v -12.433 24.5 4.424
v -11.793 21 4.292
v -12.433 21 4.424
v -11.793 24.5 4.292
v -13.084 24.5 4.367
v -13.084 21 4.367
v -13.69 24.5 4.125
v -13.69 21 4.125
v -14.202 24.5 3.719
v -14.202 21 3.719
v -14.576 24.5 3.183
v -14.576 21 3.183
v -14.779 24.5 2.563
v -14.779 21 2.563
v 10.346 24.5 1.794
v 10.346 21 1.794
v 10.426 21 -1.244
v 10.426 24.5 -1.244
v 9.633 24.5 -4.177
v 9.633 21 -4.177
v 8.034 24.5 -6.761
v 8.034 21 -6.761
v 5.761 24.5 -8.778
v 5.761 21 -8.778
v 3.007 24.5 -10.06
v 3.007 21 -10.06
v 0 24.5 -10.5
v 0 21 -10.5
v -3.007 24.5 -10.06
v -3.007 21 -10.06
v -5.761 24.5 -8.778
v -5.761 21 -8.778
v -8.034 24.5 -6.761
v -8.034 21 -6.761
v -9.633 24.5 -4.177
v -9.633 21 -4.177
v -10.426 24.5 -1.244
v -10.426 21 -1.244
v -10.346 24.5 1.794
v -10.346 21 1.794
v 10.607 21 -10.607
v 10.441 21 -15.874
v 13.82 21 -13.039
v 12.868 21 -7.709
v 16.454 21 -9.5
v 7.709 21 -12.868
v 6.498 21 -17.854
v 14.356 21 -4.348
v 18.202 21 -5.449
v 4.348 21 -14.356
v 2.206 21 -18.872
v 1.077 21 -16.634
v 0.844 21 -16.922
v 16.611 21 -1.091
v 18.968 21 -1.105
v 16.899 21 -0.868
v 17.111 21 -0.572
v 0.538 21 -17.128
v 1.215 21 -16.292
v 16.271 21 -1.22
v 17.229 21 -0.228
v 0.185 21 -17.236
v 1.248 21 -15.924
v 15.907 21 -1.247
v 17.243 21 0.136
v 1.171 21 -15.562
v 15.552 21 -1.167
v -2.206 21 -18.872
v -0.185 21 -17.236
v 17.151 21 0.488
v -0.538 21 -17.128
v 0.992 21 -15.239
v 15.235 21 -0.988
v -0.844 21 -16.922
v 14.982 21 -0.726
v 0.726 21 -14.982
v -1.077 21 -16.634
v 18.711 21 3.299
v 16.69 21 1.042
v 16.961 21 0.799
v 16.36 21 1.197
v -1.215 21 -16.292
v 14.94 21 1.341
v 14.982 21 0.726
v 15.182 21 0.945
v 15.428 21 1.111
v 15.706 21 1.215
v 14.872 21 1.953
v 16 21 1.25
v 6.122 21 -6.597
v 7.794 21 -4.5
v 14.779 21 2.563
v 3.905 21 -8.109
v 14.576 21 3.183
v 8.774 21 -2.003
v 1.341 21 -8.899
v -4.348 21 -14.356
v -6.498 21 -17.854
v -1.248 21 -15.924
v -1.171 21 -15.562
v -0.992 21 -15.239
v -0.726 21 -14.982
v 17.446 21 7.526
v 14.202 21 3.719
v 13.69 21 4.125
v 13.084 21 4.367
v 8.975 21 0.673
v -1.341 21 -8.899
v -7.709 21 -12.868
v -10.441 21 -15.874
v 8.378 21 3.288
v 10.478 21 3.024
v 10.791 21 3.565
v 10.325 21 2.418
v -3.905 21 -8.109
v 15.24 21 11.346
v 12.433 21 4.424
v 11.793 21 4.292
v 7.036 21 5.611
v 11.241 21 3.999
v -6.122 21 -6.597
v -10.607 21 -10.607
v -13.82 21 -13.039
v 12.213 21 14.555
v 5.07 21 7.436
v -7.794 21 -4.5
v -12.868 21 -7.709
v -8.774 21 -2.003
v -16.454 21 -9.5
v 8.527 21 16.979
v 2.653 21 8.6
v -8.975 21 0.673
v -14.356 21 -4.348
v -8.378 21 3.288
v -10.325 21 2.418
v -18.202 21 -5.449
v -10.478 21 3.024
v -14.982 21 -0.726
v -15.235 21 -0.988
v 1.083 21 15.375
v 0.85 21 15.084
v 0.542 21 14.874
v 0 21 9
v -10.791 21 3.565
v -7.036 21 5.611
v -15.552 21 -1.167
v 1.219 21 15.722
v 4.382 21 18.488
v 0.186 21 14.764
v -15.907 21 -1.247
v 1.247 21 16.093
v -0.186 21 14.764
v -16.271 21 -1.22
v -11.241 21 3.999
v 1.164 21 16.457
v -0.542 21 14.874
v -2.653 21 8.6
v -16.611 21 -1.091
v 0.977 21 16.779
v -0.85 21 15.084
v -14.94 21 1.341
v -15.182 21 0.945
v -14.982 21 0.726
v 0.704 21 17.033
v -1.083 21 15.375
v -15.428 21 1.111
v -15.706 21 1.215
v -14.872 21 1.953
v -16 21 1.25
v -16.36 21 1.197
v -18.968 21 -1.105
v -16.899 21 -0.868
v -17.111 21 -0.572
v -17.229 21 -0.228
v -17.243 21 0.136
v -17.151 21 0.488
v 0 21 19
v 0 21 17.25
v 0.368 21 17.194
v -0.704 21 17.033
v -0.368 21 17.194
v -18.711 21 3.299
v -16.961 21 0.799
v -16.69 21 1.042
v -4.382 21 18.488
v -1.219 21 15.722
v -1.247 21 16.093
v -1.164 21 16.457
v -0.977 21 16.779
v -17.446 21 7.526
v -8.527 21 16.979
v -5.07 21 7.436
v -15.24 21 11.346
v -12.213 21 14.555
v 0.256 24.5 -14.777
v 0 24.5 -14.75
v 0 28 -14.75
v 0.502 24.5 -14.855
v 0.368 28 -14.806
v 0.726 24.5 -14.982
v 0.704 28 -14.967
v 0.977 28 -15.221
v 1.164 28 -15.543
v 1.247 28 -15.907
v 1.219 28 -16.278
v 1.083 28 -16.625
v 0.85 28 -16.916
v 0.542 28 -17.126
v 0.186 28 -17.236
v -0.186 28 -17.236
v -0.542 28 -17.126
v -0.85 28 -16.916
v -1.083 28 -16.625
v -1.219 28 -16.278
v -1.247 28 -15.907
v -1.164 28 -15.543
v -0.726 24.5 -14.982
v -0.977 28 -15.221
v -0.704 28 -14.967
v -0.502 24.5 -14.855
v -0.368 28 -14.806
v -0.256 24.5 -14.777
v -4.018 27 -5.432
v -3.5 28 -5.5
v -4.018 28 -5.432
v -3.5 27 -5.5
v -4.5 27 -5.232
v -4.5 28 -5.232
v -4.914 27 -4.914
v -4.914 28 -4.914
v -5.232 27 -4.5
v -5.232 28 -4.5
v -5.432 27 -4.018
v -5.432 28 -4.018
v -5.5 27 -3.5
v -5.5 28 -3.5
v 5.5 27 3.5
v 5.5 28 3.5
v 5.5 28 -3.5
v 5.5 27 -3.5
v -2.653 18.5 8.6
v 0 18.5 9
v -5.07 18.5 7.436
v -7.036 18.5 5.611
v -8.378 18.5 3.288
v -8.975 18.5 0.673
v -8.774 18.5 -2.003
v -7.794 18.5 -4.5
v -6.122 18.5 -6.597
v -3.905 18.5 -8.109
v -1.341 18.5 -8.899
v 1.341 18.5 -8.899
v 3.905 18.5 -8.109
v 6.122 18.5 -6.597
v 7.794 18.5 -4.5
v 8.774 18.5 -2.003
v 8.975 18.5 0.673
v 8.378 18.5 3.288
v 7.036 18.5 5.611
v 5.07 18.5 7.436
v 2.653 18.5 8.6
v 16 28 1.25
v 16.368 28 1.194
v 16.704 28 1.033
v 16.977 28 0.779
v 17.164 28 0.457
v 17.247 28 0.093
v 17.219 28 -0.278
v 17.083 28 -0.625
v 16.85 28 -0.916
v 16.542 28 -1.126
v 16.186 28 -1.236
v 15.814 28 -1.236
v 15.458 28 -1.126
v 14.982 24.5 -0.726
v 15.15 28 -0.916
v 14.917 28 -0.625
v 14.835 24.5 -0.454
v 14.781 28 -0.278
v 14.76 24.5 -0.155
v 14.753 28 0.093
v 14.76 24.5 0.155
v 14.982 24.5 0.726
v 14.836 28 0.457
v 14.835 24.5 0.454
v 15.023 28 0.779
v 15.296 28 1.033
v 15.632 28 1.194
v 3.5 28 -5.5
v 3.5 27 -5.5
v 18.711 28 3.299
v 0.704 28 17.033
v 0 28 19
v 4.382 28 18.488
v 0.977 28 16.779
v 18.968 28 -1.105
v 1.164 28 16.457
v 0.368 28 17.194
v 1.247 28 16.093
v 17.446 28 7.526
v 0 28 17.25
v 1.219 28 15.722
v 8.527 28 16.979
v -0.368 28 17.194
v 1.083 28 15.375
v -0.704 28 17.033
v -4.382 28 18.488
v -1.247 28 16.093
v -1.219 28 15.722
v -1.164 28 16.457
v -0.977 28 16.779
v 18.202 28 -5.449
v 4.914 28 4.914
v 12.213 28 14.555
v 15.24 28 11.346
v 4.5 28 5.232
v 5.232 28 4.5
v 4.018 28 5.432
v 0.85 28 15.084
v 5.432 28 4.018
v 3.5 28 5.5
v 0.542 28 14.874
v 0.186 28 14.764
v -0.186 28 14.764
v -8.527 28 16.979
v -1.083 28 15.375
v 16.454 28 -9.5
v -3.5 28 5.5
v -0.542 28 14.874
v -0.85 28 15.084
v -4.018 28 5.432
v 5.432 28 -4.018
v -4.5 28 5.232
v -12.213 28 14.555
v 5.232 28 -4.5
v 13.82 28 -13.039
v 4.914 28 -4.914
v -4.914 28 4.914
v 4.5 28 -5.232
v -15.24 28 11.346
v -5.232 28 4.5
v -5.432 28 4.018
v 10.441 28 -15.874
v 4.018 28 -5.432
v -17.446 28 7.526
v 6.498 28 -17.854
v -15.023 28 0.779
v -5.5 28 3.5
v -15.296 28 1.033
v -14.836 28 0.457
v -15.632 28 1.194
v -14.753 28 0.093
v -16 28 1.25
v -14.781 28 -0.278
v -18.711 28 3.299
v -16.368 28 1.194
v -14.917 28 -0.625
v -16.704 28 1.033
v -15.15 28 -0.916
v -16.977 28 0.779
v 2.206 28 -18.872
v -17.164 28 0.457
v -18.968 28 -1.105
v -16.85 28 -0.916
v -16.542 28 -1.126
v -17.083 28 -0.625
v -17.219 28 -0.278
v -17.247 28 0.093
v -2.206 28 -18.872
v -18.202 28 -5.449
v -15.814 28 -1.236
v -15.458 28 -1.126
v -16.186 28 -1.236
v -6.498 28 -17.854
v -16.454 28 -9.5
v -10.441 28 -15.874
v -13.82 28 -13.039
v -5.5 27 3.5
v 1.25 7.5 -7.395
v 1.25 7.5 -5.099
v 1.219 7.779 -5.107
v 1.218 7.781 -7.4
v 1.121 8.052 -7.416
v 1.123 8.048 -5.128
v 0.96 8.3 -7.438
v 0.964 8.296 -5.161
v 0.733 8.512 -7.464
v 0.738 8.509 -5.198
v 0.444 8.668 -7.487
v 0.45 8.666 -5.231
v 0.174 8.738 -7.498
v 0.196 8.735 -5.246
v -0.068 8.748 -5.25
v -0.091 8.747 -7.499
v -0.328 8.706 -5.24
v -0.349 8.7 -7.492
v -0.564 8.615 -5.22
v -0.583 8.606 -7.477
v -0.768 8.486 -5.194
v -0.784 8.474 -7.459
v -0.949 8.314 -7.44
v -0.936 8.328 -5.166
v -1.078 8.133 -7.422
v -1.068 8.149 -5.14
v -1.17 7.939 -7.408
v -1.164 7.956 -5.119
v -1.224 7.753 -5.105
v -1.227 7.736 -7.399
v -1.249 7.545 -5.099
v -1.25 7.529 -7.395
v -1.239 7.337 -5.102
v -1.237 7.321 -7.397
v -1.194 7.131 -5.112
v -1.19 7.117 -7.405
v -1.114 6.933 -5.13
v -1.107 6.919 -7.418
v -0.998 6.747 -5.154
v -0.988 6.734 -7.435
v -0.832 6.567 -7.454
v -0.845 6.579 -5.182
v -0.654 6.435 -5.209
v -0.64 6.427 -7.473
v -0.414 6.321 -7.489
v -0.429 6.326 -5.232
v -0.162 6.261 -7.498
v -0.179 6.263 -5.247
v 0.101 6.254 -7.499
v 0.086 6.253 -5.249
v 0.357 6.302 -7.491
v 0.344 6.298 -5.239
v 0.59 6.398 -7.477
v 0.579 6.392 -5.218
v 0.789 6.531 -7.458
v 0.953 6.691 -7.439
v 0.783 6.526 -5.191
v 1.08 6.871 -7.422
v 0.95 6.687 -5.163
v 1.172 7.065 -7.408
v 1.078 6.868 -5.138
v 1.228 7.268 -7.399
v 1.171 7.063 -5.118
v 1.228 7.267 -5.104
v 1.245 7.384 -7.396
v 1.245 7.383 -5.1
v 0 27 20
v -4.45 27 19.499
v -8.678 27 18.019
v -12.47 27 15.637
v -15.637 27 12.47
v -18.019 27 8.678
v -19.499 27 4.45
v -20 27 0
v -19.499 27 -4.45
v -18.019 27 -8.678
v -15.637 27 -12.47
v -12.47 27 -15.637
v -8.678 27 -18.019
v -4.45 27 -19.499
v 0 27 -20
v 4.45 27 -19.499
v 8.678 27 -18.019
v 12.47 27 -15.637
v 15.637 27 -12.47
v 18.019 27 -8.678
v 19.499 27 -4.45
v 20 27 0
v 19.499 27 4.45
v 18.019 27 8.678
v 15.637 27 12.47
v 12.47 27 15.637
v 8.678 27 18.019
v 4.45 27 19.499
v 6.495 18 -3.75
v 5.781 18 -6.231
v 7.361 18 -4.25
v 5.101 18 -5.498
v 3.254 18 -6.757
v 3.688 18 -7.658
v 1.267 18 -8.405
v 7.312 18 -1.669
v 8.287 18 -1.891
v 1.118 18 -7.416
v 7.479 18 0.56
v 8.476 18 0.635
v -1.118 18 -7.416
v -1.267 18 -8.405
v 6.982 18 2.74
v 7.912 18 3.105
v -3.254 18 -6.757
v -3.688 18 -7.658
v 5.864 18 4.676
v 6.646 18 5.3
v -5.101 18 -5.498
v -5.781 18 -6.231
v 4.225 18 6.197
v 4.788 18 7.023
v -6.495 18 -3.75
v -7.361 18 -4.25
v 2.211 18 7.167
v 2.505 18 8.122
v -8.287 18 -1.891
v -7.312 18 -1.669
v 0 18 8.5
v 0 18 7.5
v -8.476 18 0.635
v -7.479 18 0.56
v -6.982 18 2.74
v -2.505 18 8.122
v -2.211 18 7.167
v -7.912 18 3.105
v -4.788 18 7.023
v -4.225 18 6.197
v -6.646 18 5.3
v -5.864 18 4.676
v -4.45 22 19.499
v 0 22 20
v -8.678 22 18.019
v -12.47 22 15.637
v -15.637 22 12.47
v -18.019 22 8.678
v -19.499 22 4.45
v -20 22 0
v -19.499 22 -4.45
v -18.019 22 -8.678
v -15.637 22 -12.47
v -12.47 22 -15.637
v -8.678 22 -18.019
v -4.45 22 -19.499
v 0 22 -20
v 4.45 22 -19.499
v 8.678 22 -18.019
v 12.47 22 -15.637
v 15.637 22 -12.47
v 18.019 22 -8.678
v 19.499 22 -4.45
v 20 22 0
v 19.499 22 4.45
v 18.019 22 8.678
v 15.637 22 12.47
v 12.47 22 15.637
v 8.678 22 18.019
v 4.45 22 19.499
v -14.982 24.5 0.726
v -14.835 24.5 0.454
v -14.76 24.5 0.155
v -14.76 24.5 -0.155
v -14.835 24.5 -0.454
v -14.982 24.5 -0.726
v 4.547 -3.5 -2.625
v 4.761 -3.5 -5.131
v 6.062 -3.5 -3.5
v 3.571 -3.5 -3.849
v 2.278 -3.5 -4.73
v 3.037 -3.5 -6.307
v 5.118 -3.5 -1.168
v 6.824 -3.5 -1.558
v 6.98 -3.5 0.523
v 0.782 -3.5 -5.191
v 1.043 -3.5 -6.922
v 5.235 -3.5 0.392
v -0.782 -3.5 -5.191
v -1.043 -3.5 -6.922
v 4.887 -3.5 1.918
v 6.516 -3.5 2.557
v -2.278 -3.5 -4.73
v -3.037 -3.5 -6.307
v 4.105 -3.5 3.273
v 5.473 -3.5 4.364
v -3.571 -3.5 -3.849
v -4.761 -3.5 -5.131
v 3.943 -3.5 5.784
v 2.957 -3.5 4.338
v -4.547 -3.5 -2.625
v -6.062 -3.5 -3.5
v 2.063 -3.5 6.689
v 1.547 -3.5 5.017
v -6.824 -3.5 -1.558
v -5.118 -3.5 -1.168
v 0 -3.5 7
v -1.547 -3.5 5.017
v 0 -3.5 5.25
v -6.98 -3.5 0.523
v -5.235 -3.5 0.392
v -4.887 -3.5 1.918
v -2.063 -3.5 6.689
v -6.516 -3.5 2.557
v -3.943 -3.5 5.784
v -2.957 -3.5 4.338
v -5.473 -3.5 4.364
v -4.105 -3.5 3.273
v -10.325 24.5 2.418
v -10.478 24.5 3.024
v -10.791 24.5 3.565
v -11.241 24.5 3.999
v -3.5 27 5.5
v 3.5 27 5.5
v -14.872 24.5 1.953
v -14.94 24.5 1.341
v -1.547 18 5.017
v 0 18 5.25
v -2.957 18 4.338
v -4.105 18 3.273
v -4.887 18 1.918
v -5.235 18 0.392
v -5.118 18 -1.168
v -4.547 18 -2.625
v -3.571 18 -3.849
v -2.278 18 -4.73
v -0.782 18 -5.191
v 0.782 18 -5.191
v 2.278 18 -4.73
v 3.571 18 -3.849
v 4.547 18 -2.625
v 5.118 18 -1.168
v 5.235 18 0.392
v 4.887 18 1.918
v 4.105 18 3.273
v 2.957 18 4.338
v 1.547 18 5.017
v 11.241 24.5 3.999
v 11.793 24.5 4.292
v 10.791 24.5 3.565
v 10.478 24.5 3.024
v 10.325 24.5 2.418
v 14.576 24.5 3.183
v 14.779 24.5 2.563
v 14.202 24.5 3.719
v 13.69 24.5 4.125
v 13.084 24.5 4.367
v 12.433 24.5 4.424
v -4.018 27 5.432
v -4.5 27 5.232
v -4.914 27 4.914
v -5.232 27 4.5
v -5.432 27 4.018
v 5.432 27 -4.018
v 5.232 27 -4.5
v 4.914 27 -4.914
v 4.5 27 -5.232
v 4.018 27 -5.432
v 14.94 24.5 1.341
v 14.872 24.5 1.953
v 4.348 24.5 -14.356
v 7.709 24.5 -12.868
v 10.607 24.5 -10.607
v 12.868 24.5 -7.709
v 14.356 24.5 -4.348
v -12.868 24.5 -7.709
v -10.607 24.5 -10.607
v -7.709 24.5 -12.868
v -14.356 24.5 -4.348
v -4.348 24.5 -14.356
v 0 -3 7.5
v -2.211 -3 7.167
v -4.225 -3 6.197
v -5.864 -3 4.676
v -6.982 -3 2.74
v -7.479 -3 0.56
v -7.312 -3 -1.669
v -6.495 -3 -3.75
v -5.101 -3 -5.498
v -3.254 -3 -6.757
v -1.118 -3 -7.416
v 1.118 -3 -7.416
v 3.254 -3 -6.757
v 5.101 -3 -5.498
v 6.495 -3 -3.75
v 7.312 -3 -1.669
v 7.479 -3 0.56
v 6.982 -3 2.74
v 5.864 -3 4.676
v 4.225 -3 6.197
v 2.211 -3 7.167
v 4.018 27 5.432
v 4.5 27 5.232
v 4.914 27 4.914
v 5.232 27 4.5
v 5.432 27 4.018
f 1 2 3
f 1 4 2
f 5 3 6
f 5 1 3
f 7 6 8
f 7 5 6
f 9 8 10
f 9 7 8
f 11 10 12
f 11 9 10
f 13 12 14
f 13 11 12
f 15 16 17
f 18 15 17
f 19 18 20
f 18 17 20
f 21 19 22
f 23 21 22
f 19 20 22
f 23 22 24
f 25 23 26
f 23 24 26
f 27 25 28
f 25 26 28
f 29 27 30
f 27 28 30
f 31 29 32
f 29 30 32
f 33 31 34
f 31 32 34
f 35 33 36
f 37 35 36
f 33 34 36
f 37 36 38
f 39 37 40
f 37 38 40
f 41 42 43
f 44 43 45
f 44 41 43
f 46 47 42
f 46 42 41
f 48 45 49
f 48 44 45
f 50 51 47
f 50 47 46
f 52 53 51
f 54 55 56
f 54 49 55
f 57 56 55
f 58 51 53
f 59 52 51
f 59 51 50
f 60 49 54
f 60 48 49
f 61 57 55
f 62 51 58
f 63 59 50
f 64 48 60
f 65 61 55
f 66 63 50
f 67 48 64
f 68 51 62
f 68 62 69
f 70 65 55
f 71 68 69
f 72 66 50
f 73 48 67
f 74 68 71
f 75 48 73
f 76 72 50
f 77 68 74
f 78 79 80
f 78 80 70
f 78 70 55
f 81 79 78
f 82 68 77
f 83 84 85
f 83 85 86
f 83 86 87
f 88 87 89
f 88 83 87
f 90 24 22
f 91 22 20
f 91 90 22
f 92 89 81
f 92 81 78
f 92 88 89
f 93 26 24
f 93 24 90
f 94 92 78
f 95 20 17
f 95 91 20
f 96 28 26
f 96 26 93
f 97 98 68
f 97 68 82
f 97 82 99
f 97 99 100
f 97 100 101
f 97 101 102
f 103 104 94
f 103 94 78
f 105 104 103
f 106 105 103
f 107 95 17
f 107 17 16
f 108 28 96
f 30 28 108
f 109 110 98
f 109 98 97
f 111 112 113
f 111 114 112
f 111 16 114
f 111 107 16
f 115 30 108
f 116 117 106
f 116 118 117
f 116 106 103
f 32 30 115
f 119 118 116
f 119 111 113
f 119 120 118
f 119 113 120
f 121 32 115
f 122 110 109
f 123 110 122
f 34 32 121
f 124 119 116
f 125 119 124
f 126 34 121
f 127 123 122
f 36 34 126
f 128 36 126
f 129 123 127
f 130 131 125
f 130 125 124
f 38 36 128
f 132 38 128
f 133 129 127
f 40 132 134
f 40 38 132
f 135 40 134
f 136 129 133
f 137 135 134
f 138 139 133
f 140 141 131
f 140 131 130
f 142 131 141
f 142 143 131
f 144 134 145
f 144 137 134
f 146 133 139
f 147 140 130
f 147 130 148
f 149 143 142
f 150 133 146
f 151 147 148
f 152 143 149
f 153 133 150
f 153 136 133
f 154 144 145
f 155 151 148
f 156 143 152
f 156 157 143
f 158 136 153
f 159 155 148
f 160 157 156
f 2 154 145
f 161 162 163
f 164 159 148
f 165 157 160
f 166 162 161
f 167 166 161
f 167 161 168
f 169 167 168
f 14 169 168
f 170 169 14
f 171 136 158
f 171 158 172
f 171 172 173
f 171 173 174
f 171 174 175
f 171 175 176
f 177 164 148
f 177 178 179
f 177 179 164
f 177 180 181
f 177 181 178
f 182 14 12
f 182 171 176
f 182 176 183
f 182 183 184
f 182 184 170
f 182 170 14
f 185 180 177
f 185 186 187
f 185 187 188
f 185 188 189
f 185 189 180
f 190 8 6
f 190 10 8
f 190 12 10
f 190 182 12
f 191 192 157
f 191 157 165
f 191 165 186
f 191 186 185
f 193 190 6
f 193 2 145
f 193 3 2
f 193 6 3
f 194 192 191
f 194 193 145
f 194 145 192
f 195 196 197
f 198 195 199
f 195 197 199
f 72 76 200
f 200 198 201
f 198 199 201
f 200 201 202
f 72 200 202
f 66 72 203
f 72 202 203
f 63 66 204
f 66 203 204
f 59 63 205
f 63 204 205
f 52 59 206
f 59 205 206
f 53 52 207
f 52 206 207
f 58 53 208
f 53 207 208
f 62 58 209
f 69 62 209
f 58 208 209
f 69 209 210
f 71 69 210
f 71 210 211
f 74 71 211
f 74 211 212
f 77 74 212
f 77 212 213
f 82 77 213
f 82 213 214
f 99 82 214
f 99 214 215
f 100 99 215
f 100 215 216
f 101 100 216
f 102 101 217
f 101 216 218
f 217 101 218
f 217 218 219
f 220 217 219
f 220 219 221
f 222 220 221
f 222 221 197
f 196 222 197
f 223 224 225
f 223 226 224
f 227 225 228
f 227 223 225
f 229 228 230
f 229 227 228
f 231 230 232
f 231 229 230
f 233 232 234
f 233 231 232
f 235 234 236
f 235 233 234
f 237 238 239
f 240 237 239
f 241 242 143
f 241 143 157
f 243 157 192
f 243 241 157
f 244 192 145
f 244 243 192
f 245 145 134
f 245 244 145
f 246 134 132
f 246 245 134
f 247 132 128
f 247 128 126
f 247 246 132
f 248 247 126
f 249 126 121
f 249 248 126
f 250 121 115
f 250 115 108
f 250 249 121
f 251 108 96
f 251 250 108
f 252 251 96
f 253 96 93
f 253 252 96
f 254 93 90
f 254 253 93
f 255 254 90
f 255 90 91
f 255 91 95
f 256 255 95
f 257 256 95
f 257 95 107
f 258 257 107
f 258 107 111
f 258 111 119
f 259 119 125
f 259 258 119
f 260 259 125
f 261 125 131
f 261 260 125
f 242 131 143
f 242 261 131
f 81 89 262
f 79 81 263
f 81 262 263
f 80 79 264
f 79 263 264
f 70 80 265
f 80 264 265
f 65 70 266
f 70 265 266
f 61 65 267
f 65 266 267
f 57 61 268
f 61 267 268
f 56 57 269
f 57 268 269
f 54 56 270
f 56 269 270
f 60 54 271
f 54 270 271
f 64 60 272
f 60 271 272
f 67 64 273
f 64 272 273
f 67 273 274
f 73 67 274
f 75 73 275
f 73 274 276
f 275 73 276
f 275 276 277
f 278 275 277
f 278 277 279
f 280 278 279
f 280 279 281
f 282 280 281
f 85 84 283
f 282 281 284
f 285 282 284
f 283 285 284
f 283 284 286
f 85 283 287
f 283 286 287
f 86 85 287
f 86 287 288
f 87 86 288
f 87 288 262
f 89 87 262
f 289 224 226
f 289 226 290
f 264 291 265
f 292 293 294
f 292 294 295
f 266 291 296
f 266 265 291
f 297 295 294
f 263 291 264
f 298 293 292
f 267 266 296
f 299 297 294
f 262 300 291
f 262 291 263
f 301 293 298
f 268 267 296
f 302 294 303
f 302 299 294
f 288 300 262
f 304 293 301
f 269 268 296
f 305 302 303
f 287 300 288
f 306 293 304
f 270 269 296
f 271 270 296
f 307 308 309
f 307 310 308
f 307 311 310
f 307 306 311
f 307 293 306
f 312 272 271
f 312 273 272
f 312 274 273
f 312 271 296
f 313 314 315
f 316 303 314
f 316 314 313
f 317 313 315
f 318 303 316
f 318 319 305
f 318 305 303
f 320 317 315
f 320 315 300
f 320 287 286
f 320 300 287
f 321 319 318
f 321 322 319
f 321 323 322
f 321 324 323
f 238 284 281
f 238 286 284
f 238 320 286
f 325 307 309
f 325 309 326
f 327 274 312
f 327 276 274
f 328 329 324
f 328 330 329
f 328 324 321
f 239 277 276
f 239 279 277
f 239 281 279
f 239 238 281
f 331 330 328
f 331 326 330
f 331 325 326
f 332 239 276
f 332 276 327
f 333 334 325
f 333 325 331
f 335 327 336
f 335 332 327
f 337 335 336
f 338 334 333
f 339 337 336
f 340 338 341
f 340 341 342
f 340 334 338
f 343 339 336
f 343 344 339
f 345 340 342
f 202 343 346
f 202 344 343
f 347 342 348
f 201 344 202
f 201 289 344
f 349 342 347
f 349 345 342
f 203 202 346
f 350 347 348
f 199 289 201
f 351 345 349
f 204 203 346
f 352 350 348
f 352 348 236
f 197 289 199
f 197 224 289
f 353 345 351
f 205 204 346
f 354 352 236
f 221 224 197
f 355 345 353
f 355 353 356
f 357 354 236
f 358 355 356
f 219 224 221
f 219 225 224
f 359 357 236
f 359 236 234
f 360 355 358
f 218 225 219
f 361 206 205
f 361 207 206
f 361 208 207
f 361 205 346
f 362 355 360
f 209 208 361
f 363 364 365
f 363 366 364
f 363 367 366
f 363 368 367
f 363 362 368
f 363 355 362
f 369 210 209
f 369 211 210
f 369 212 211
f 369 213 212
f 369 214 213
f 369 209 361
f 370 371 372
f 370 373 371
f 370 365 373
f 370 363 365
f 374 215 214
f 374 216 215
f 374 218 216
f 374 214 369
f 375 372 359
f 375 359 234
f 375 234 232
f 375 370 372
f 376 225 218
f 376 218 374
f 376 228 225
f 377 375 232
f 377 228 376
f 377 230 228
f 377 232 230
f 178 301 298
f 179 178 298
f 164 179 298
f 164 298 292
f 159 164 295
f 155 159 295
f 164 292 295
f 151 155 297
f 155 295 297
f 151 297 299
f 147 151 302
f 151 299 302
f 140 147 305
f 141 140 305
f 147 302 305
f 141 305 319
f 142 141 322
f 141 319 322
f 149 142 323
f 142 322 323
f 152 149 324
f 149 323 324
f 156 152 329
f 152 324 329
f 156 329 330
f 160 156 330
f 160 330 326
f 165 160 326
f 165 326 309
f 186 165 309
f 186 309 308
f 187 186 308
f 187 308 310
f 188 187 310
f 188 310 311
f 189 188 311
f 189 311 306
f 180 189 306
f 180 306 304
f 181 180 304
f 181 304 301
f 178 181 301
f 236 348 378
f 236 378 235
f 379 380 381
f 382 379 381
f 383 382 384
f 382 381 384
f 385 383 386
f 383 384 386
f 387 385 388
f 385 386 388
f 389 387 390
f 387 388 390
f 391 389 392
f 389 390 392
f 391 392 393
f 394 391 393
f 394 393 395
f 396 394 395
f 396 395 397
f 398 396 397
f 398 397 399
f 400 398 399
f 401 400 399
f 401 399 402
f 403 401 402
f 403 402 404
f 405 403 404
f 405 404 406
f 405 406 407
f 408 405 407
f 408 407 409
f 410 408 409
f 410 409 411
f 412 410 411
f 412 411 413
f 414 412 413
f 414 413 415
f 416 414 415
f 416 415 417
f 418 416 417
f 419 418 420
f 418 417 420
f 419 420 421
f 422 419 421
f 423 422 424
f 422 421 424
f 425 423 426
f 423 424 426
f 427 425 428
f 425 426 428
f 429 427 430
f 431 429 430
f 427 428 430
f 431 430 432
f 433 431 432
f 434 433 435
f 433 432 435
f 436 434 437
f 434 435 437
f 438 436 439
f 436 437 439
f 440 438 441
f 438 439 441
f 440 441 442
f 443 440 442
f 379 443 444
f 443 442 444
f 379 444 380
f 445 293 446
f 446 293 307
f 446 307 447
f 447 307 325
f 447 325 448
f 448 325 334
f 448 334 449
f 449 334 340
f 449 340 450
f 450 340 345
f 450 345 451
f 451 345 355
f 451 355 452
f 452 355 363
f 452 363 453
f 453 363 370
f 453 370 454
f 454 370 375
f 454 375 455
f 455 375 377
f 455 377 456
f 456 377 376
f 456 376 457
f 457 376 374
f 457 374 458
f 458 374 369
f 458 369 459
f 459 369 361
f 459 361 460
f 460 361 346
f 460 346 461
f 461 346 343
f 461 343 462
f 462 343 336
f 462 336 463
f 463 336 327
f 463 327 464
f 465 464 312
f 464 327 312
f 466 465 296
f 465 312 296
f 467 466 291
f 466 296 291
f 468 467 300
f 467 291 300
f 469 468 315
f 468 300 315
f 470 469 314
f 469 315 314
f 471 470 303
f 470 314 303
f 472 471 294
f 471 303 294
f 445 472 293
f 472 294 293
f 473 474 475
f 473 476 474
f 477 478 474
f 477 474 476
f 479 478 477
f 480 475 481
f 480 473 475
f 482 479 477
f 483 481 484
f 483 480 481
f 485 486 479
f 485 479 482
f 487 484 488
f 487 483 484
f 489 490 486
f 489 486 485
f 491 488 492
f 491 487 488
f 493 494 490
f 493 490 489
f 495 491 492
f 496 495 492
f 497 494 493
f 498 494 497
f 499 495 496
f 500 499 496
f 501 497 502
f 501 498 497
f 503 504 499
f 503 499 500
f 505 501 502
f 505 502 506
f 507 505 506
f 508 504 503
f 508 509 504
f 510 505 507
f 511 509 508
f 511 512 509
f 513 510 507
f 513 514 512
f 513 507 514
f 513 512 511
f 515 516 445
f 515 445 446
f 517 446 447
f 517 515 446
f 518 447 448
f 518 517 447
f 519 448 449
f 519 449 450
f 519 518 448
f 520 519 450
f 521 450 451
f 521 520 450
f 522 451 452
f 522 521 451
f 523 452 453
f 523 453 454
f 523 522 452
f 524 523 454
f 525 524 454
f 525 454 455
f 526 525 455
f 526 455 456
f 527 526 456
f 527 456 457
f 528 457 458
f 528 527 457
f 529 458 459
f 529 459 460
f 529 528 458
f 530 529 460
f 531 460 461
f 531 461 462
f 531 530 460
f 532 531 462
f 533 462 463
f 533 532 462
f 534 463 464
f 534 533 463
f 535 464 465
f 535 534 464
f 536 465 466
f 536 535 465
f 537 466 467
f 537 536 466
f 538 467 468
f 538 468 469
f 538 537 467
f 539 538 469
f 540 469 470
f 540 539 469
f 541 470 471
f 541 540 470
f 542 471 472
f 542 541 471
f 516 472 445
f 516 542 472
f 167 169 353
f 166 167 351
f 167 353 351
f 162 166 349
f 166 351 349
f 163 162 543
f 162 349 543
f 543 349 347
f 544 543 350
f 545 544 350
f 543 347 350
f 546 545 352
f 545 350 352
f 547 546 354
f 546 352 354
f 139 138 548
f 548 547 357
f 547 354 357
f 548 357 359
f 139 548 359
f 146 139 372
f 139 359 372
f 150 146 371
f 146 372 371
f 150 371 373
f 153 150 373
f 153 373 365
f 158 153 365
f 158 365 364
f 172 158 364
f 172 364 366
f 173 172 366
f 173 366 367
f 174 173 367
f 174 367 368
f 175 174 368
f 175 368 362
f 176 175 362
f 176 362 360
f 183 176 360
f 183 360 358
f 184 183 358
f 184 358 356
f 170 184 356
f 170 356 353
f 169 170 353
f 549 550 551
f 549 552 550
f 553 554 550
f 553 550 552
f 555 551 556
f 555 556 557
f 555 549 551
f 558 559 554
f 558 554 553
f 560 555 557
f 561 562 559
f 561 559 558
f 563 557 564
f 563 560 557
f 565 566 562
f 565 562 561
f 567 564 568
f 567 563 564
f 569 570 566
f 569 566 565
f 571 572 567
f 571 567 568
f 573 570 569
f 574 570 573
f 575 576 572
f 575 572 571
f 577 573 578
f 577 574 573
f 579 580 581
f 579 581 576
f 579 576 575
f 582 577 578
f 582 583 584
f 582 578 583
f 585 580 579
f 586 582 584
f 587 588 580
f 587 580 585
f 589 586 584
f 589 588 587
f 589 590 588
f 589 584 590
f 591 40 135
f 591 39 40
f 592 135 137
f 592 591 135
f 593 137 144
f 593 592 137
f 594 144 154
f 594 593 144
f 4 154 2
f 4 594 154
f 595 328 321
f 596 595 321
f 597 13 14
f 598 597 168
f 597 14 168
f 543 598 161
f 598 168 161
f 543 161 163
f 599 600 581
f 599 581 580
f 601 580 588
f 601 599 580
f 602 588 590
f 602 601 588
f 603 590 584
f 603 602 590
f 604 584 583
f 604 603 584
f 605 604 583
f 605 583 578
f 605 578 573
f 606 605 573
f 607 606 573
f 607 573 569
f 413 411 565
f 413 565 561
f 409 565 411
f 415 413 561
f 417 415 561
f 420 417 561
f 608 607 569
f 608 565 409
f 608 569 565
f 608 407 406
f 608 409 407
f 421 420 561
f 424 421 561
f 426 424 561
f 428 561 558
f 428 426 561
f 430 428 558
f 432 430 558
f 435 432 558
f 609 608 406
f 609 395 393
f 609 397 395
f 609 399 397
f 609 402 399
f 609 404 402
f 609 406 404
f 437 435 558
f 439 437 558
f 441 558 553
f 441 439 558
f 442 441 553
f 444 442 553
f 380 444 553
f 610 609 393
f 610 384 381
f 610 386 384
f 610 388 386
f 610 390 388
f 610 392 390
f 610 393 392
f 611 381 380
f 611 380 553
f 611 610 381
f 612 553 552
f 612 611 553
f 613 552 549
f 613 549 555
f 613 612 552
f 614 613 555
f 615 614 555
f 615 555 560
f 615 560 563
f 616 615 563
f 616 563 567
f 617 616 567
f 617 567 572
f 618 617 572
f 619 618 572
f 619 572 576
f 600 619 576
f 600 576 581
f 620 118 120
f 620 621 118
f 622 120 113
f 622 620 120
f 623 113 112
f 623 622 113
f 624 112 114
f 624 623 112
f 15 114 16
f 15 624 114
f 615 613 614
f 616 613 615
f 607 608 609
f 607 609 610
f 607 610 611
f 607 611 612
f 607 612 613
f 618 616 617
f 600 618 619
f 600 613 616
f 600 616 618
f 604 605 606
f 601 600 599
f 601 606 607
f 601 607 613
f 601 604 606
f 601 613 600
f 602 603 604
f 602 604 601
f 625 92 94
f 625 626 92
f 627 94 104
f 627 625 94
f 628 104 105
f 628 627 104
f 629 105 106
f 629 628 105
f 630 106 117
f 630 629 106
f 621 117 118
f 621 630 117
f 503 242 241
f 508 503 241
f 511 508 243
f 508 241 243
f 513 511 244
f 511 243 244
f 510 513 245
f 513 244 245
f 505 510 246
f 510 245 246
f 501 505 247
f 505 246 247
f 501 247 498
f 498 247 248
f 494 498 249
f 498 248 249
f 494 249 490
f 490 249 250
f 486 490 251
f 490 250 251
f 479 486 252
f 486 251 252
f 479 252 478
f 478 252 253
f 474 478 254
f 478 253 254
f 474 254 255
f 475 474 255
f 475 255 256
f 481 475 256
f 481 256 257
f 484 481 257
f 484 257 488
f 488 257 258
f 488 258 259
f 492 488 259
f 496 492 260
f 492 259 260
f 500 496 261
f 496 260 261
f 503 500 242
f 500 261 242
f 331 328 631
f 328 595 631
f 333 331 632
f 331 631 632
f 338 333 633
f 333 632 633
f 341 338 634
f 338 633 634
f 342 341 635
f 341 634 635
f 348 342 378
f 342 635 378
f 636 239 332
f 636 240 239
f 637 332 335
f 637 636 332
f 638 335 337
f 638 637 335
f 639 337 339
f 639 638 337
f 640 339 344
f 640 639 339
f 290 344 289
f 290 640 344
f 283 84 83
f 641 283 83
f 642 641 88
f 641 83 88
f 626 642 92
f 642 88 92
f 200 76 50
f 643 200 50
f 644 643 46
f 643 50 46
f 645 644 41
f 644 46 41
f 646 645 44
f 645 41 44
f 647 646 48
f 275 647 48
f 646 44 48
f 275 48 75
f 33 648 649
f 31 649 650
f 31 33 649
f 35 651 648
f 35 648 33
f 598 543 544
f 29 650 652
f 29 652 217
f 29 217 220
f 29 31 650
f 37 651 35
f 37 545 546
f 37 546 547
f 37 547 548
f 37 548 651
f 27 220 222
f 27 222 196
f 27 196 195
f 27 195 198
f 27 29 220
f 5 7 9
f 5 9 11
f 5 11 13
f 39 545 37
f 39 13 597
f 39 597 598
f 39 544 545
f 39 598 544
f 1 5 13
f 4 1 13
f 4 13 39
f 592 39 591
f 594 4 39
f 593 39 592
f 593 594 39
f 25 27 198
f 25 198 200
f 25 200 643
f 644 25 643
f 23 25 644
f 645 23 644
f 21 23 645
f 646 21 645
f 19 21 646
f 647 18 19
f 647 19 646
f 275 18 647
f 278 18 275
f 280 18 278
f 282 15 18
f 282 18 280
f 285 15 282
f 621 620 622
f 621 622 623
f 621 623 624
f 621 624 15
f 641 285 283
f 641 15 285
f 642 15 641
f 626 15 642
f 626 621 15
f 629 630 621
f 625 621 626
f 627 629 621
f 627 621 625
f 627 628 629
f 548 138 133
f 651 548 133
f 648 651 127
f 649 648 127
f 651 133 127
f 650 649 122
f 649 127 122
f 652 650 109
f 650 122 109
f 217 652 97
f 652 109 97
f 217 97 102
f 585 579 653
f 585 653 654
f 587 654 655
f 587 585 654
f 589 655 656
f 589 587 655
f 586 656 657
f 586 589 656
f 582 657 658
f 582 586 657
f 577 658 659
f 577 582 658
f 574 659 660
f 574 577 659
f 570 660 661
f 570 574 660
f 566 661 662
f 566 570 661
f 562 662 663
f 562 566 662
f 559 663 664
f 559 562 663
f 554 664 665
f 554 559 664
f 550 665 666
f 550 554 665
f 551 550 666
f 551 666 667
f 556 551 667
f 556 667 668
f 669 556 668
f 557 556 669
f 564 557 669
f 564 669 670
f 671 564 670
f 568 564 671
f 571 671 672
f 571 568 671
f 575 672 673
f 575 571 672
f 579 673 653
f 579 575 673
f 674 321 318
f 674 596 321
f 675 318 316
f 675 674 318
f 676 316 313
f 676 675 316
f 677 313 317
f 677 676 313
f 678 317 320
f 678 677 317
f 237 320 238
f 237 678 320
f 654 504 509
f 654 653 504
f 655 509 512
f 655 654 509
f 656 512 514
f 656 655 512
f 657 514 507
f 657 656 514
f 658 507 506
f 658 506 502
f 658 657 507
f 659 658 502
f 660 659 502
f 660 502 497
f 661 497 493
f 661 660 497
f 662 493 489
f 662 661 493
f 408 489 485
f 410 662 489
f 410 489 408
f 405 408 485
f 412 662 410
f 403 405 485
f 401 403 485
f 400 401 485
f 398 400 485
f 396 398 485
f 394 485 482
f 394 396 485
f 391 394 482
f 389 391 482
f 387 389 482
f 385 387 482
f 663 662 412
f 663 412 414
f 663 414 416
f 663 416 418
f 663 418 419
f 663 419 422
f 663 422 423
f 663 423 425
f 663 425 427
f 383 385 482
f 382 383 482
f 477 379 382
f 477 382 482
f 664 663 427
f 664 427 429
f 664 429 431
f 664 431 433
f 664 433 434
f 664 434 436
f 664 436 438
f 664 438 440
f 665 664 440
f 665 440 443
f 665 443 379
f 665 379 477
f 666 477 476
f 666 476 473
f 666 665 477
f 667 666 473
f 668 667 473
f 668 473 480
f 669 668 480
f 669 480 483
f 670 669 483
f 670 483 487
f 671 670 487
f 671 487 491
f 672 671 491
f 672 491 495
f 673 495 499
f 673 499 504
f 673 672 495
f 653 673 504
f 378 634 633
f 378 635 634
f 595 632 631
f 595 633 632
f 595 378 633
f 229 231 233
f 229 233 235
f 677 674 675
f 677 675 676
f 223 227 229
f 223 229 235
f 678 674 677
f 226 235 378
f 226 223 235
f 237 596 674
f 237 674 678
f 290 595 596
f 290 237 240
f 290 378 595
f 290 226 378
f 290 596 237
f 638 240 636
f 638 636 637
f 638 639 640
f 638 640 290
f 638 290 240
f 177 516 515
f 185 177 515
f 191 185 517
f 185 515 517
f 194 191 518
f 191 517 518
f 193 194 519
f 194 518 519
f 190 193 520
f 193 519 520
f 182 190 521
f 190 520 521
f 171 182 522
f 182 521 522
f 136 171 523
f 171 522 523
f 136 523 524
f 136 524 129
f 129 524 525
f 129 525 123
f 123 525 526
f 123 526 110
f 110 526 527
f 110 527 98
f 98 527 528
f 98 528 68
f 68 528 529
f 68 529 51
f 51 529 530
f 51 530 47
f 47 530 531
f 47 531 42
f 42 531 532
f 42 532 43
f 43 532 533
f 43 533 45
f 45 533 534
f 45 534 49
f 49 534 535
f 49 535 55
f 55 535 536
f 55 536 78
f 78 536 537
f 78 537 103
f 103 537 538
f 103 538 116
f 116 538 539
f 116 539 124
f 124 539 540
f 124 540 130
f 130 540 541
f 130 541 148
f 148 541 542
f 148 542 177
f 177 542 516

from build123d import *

# Parameters (mm, degrees)
SKETCH_2_W             = 11
SKETCH_2_H             = 11
CUT_EXTRUDE_1_DEPTH    = 1
FILLET_1_R             = 2
SKETCH_5_R             = 7.5
SKETCH_5_R_2           = 5.25
EXTRUDE_1_DEPTH        = 3.5
SKETCH_6_R             = 1.25
CUT_EXTRUDE_M3_1_DEPTH = 40.799497484
CHAMFER_1_SIZE         = 0.5
CUT_EXTRUDE_M3_REACH   = 44.335
SKETCH_7_R             = 1.25
CHAMFER_2_SIZE         = 1
CUT_EXTRUDE_14_DEPTH   = 3.5
FILLET_2_R             = 2.25


with BuildPart() as part:
    # 草图1 → 旋转1 (revolve)
    with BuildSketch(Plane(origin=(0, 0, 0), x_dir=(0, 0, -1), z_dir=(1, 0, 0))):
        Polygon((-7.5, 0), (-5.25, 0), (-5.25, 18), (0, 18), (0, 28), (-20, 28), (-20, 21), (-9, 21), (-9, 18), (-7.5, 18), align=None)
    revolve(axis=Axis((0, 28, 0), (0, -1, 0)))

    # 草图2 → 切除-拉伸1 (cut)
    with BuildSketch(Plane(origin=(0, 28, 0), x_dir=(1, 0, 0), z_dir=(0, 1, 0))):
        Rectangle(SKETCH_2_W, SKETCH_2_H)
    extrude(amount=-CUT_EXTRUDE_1_DEPTH, mode=Mode.SUBTRACT)

    # 圆角1
    fillet_1_edges = [part.edges().sort_by_distance(p)[0] for p in [
        (5.5, 27.5, -5.5),
        (5.5, 27.5, 5.5),
        (-5.5, 27.5, 5.5),
        (-5.5, 27.5, -5.5),
    ]]
    fillet(fillet_1_edges, radius=FILLET_1_R)

    # 草图5 → 凸台-拉伸1 (add)
    with BuildSketch(Plane.XZ):
        with Locations(Location((0, 0, 0), (0, 0, 90))):
            Circle(SKETCH_5_R)
        with Locations(Location((0, 0, 0), (0, 0, 90))):
            Circle(SKETCH_5_R_2, mode=Mode.SUBTRACT)
    extrude(amount=EXTRUDE_1_DEPTH)

    # 草图6 → M3螺纹孔1 (cut, through all)
    with BuildSketch(Plane.XY):
        with Locations((0, 7.5)):
            Circle(SKETCH_6_R)
    extrude(amount=-CUT_EXTRUDE_M3_1_DEPTH, mode=Mode.SUBTRACT)

    # 倒角1
    chamfer_1_edges = [part.edges().sort_by_distance(p)[0] for p in [
        (0, -3.5, -7.5),
        (0, 18, -9),
    ]]
    chamfer(chamfer_1_edges, length=CHAMFER_1_SIZE)

    # 草图7 → M3螺纹孔 (cut, up to next)
    with BuildSketch(Plane(origin=(0, 28, 0), x_dir=(1, 0, 0), z_dir=(0, 1, 0)), mode=Mode.PRIVATE) as cut_extrude_m3_sk1:
        with Locations(Location((0, 16, 0), (0, 0, 270))):
            Circle(SKETCH_7_R)
    cut_extrude_m3_tool1 = extrude(cut_extrude_m3_sk1.sketch, amount=-CUT_EXTRUDE_M3_REACH, mode=Mode.PRIVATE) & part.part
    # 草图7 → M3螺纹孔 (cut, up to next)
    with BuildSketch(Plane(origin=(0, 28, 0), x_dir=(1, 0, 0), z_dir=(0, 1, 0)), mode=Mode.PRIVATE) as cut_extrude_m3_sk2:
        with Locations(Location((16, 0, 0), (0, 0, 270))):
            Circle(SKETCH_7_R)
    cut_extrude_m3_tool2 = extrude(cut_extrude_m3_sk2.sketch, amount=-CUT_EXTRUDE_M3_REACH, mode=Mode.PRIVATE) & part.part
    # 草图7 → M3螺纹孔 (cut, up to next)
    with BuildSketch(Plane(origin=(0, 28, 0), x_dir=(1, 0, 0), z_dir=(0, 1, 0)), mode=Mode.PRIVATE) as cut_extrude_m3_sk3:
        with Locations(Location((0, -16, 0), (0, 0, 270))):
            Circle(SKETCH_7_R)
    cut_extrude_m3_tool3 = extrude(cut_extrude_m3_sk3.sketch, amount=-CUT_EXTRUDE_M3_REACH, mode=Mode.PRIVATE) & part.part
    # 草图7 → M3螺纹孔 (cut, up to next)
    with BuildSketch(Plane(origin=(0, 28, 0), x_dir=(1, 0, 0), z_dir=(0, 1, 0)), mode=Mode.PRIVATE) as cut_extrude_m3_sk4:
        with Locations(Location((-16, 0, 0), (0, 0, 270))):
            Circle(SKETCH_7_R)
    cut_extrude_m3_tool4 = extrude(cut_extrude_m3_sk4.sketch, amount=-CUT_EXTRUDE_M3_REACH, mode=Mode.PRIVATE) & part.part
    add(cut_extrude_m3_tool1.solids().sort_by_distance((0, 28, -16))[0], mode=Mode.SUBTRACT)
    add(cut_extrude_m3_tool2.solids().sort_by_distance((16, 28, 0))[0], mode=Mode.SUBTRACT)
    add(cut_extrude_m3_tool3.solids().sort_by_distance((0, 28, 16))[0], mode=Mode.SUBTRACT)
    add(cut_extrude_m3_tool4.solids().sort_by_distance((-16, 28, 0))[0], mode=Mode.SUBTRACT)

    # 倒角2
    chamfer_2_edges = [part.edges().sort_by_distance(p)[0] for p in [
        (0, 28, -20),
        (0, 21, -20),
    ]]
    chamfer(chamfer_2_edges, length=CHAMFER_2_SIZE)

    # 草图8 → 切除-拉伸14 (cut)
    with BuildSketch(Plane.XZ.offset(-21)):
        with BuildLine():
            Line((-9.866772518, 3.591211505), (-14.095389312, 5.13030215))
            ThreePointArc((-14.095389312, 5.13030215), (0, -15), (14.095389312, 5.13030215))
            Line((14.095389312, 5.13030215), (9.866772518, 3.591211505))
            ThreePointArc((9.866772518, 3.591211505), (0, -10.5), (-9.866772518, 3.591211505))
        make_face()
    extrude(amount=-CUT_EXTRUDE_14_DEPTH, mode=Mode.SUBTRACT)

    # 圆角2
    fillet_2_edges = [part.edges().sort_by_distance(p)[0] for p in [
        (9.866772518, 22.75, 3.591211505),
        (14.095389312, 22.75, 5.13030215),
        (-9.866772518, 22.75, 3.591211505),
        (-14.095389312, 22.75, 5.13030215),
    ]]
    fillet(fillet_2_edges, radius=FILLET_2_R - 0.0001)  # a hair under: the kernel refuses the full size


solid = part.part
